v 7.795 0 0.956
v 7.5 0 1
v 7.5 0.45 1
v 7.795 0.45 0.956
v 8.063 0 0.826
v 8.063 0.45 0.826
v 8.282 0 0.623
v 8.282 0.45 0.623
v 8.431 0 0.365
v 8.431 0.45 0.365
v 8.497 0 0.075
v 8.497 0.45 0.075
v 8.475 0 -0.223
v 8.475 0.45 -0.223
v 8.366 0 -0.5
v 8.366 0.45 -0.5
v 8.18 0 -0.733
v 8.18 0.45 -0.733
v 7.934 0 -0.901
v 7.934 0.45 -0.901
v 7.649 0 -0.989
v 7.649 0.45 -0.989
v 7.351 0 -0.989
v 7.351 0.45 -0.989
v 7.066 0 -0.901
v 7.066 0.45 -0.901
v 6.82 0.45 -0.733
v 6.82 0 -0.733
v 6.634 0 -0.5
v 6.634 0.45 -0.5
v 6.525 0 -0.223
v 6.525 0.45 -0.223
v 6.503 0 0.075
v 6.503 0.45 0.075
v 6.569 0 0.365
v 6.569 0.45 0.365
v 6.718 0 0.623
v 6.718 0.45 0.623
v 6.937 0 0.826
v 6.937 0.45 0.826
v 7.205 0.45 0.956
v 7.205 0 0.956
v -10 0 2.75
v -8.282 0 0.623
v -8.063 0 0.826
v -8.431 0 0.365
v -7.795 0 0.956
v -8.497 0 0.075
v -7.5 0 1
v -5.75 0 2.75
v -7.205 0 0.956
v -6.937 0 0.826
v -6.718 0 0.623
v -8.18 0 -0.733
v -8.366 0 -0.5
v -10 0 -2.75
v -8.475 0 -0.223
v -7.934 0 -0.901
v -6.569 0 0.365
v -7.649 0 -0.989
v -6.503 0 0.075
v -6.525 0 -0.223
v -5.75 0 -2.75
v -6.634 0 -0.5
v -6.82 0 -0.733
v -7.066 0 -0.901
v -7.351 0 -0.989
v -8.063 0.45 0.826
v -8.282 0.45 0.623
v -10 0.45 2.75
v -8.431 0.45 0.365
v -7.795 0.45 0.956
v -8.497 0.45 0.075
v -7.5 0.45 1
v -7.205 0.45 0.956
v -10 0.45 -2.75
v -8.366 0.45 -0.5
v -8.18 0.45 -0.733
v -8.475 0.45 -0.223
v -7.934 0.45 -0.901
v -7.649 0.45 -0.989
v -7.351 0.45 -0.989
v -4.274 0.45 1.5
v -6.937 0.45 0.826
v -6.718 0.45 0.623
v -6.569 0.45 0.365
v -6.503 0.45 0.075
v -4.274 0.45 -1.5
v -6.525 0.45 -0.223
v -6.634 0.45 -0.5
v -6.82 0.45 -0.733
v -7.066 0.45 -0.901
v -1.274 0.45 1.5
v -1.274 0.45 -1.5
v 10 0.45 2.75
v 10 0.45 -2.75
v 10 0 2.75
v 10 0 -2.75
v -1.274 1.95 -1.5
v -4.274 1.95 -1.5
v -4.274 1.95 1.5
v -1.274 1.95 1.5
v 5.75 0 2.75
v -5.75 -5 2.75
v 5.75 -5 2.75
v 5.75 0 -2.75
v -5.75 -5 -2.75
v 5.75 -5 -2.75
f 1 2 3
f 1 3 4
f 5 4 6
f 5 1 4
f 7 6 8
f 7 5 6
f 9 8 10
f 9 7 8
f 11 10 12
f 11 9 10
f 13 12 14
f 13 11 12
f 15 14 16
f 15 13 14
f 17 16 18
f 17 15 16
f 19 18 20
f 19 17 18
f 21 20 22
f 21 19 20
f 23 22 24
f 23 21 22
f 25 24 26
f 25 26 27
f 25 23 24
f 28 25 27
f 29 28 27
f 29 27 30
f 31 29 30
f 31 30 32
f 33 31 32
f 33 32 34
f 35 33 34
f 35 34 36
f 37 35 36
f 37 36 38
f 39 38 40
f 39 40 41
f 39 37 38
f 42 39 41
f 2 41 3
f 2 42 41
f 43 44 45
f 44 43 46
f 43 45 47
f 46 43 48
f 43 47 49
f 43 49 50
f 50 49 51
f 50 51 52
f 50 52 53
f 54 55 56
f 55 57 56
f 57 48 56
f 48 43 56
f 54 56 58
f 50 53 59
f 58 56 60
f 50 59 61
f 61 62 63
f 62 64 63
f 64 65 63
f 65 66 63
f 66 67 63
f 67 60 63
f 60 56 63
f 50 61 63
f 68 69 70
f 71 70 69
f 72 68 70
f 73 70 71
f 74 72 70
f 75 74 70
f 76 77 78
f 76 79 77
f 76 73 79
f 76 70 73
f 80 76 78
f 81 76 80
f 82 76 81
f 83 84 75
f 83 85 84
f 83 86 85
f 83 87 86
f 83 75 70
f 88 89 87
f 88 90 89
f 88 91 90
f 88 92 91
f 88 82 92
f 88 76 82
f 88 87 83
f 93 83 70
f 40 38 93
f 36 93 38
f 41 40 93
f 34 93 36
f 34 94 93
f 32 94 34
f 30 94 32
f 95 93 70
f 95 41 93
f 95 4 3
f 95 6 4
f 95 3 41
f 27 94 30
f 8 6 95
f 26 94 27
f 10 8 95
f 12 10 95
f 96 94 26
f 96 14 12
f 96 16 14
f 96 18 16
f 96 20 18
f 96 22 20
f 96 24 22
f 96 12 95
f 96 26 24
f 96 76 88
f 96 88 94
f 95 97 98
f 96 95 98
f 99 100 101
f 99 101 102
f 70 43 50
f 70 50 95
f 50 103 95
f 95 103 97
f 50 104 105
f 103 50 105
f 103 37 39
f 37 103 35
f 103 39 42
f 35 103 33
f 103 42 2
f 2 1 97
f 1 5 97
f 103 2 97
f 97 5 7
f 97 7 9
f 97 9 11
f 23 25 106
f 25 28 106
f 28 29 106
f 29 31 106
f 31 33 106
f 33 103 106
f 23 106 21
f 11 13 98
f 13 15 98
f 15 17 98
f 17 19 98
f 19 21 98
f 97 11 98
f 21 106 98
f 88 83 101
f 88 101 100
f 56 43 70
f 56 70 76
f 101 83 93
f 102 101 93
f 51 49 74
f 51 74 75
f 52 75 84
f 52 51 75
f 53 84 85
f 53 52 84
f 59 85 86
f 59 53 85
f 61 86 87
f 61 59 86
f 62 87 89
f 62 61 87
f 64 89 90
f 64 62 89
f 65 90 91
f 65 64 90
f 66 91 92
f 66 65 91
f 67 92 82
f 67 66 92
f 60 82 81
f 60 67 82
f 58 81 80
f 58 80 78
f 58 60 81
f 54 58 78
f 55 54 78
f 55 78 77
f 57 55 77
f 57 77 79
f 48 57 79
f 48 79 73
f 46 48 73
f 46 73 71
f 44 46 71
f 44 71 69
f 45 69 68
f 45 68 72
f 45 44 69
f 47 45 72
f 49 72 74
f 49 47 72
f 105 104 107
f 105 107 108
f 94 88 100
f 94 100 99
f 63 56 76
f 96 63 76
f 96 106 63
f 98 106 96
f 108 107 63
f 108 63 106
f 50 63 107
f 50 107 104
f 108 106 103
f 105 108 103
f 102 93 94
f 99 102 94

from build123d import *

# Parameters (mm, degrees)
CROQUIS1_W              = 20
CROQUIS1_H              = 5.5
CROQUIS1_R              = 1
SALIENTE_EXTRUIR1_DEPTH = 0.45
CROQUIS2_W              = 11.5
CROQUIS2_H              = 5.5
SALIENTE_EXTRUIR2_DEPTH = 5
CROQUIS3_W              = 3
CROQUIS3_H              = 3
SALIENTE_EXTRUIR3_DEPTH = 1.5


with BuildPart() as part:
    # Croquis1 → Saliente-Extruir1 (new body)
    with BuildSketch(Plane(origin=(0, 0, 0), x_dir=(1, 0, 0), z_dir=(0, 1, 0))):
        Rectangle(CROQUIS1_W, CROQUIS1_H)
        with Locations(Location((-7.5, 0, 0), (0, 0, 270))):
            Circle(CROQUIS1_R, mode=Mode.SUBTRACT)
        with Locations(Location((7.5, 0, 0), (0, 0, 270))):
            Circle(CROQUIS1_R, mode=Mode.SUBTRACT)
    extrude(amount=SALIENTE_EXTRUIR1_DEPTH)

    # Croquis2 → Saliente-Extruir2 (add)
    with BuildSketch(Plane.XZ):
        Rectangle(CROQUIS2_W, CROQUIS2_H)
    extrude(amount=SALIENTE_EXTRUIR2_DEPTH)

    # Croquis3 → Saliente-Extruir3 (add)
    with BuildSketch(Plane(origin=(0, 0.45, 0), x_dir=(1, 0, 0), z_dir=(0, 1, 0))):
        with Locations((-2.774167271, 0)):
            Rectangle(CROQUIS3_W, CROQUIS3_H)
    extrude(amount=SALIENTE_EXTRUIR3_DEPTH)


solid = part.part
